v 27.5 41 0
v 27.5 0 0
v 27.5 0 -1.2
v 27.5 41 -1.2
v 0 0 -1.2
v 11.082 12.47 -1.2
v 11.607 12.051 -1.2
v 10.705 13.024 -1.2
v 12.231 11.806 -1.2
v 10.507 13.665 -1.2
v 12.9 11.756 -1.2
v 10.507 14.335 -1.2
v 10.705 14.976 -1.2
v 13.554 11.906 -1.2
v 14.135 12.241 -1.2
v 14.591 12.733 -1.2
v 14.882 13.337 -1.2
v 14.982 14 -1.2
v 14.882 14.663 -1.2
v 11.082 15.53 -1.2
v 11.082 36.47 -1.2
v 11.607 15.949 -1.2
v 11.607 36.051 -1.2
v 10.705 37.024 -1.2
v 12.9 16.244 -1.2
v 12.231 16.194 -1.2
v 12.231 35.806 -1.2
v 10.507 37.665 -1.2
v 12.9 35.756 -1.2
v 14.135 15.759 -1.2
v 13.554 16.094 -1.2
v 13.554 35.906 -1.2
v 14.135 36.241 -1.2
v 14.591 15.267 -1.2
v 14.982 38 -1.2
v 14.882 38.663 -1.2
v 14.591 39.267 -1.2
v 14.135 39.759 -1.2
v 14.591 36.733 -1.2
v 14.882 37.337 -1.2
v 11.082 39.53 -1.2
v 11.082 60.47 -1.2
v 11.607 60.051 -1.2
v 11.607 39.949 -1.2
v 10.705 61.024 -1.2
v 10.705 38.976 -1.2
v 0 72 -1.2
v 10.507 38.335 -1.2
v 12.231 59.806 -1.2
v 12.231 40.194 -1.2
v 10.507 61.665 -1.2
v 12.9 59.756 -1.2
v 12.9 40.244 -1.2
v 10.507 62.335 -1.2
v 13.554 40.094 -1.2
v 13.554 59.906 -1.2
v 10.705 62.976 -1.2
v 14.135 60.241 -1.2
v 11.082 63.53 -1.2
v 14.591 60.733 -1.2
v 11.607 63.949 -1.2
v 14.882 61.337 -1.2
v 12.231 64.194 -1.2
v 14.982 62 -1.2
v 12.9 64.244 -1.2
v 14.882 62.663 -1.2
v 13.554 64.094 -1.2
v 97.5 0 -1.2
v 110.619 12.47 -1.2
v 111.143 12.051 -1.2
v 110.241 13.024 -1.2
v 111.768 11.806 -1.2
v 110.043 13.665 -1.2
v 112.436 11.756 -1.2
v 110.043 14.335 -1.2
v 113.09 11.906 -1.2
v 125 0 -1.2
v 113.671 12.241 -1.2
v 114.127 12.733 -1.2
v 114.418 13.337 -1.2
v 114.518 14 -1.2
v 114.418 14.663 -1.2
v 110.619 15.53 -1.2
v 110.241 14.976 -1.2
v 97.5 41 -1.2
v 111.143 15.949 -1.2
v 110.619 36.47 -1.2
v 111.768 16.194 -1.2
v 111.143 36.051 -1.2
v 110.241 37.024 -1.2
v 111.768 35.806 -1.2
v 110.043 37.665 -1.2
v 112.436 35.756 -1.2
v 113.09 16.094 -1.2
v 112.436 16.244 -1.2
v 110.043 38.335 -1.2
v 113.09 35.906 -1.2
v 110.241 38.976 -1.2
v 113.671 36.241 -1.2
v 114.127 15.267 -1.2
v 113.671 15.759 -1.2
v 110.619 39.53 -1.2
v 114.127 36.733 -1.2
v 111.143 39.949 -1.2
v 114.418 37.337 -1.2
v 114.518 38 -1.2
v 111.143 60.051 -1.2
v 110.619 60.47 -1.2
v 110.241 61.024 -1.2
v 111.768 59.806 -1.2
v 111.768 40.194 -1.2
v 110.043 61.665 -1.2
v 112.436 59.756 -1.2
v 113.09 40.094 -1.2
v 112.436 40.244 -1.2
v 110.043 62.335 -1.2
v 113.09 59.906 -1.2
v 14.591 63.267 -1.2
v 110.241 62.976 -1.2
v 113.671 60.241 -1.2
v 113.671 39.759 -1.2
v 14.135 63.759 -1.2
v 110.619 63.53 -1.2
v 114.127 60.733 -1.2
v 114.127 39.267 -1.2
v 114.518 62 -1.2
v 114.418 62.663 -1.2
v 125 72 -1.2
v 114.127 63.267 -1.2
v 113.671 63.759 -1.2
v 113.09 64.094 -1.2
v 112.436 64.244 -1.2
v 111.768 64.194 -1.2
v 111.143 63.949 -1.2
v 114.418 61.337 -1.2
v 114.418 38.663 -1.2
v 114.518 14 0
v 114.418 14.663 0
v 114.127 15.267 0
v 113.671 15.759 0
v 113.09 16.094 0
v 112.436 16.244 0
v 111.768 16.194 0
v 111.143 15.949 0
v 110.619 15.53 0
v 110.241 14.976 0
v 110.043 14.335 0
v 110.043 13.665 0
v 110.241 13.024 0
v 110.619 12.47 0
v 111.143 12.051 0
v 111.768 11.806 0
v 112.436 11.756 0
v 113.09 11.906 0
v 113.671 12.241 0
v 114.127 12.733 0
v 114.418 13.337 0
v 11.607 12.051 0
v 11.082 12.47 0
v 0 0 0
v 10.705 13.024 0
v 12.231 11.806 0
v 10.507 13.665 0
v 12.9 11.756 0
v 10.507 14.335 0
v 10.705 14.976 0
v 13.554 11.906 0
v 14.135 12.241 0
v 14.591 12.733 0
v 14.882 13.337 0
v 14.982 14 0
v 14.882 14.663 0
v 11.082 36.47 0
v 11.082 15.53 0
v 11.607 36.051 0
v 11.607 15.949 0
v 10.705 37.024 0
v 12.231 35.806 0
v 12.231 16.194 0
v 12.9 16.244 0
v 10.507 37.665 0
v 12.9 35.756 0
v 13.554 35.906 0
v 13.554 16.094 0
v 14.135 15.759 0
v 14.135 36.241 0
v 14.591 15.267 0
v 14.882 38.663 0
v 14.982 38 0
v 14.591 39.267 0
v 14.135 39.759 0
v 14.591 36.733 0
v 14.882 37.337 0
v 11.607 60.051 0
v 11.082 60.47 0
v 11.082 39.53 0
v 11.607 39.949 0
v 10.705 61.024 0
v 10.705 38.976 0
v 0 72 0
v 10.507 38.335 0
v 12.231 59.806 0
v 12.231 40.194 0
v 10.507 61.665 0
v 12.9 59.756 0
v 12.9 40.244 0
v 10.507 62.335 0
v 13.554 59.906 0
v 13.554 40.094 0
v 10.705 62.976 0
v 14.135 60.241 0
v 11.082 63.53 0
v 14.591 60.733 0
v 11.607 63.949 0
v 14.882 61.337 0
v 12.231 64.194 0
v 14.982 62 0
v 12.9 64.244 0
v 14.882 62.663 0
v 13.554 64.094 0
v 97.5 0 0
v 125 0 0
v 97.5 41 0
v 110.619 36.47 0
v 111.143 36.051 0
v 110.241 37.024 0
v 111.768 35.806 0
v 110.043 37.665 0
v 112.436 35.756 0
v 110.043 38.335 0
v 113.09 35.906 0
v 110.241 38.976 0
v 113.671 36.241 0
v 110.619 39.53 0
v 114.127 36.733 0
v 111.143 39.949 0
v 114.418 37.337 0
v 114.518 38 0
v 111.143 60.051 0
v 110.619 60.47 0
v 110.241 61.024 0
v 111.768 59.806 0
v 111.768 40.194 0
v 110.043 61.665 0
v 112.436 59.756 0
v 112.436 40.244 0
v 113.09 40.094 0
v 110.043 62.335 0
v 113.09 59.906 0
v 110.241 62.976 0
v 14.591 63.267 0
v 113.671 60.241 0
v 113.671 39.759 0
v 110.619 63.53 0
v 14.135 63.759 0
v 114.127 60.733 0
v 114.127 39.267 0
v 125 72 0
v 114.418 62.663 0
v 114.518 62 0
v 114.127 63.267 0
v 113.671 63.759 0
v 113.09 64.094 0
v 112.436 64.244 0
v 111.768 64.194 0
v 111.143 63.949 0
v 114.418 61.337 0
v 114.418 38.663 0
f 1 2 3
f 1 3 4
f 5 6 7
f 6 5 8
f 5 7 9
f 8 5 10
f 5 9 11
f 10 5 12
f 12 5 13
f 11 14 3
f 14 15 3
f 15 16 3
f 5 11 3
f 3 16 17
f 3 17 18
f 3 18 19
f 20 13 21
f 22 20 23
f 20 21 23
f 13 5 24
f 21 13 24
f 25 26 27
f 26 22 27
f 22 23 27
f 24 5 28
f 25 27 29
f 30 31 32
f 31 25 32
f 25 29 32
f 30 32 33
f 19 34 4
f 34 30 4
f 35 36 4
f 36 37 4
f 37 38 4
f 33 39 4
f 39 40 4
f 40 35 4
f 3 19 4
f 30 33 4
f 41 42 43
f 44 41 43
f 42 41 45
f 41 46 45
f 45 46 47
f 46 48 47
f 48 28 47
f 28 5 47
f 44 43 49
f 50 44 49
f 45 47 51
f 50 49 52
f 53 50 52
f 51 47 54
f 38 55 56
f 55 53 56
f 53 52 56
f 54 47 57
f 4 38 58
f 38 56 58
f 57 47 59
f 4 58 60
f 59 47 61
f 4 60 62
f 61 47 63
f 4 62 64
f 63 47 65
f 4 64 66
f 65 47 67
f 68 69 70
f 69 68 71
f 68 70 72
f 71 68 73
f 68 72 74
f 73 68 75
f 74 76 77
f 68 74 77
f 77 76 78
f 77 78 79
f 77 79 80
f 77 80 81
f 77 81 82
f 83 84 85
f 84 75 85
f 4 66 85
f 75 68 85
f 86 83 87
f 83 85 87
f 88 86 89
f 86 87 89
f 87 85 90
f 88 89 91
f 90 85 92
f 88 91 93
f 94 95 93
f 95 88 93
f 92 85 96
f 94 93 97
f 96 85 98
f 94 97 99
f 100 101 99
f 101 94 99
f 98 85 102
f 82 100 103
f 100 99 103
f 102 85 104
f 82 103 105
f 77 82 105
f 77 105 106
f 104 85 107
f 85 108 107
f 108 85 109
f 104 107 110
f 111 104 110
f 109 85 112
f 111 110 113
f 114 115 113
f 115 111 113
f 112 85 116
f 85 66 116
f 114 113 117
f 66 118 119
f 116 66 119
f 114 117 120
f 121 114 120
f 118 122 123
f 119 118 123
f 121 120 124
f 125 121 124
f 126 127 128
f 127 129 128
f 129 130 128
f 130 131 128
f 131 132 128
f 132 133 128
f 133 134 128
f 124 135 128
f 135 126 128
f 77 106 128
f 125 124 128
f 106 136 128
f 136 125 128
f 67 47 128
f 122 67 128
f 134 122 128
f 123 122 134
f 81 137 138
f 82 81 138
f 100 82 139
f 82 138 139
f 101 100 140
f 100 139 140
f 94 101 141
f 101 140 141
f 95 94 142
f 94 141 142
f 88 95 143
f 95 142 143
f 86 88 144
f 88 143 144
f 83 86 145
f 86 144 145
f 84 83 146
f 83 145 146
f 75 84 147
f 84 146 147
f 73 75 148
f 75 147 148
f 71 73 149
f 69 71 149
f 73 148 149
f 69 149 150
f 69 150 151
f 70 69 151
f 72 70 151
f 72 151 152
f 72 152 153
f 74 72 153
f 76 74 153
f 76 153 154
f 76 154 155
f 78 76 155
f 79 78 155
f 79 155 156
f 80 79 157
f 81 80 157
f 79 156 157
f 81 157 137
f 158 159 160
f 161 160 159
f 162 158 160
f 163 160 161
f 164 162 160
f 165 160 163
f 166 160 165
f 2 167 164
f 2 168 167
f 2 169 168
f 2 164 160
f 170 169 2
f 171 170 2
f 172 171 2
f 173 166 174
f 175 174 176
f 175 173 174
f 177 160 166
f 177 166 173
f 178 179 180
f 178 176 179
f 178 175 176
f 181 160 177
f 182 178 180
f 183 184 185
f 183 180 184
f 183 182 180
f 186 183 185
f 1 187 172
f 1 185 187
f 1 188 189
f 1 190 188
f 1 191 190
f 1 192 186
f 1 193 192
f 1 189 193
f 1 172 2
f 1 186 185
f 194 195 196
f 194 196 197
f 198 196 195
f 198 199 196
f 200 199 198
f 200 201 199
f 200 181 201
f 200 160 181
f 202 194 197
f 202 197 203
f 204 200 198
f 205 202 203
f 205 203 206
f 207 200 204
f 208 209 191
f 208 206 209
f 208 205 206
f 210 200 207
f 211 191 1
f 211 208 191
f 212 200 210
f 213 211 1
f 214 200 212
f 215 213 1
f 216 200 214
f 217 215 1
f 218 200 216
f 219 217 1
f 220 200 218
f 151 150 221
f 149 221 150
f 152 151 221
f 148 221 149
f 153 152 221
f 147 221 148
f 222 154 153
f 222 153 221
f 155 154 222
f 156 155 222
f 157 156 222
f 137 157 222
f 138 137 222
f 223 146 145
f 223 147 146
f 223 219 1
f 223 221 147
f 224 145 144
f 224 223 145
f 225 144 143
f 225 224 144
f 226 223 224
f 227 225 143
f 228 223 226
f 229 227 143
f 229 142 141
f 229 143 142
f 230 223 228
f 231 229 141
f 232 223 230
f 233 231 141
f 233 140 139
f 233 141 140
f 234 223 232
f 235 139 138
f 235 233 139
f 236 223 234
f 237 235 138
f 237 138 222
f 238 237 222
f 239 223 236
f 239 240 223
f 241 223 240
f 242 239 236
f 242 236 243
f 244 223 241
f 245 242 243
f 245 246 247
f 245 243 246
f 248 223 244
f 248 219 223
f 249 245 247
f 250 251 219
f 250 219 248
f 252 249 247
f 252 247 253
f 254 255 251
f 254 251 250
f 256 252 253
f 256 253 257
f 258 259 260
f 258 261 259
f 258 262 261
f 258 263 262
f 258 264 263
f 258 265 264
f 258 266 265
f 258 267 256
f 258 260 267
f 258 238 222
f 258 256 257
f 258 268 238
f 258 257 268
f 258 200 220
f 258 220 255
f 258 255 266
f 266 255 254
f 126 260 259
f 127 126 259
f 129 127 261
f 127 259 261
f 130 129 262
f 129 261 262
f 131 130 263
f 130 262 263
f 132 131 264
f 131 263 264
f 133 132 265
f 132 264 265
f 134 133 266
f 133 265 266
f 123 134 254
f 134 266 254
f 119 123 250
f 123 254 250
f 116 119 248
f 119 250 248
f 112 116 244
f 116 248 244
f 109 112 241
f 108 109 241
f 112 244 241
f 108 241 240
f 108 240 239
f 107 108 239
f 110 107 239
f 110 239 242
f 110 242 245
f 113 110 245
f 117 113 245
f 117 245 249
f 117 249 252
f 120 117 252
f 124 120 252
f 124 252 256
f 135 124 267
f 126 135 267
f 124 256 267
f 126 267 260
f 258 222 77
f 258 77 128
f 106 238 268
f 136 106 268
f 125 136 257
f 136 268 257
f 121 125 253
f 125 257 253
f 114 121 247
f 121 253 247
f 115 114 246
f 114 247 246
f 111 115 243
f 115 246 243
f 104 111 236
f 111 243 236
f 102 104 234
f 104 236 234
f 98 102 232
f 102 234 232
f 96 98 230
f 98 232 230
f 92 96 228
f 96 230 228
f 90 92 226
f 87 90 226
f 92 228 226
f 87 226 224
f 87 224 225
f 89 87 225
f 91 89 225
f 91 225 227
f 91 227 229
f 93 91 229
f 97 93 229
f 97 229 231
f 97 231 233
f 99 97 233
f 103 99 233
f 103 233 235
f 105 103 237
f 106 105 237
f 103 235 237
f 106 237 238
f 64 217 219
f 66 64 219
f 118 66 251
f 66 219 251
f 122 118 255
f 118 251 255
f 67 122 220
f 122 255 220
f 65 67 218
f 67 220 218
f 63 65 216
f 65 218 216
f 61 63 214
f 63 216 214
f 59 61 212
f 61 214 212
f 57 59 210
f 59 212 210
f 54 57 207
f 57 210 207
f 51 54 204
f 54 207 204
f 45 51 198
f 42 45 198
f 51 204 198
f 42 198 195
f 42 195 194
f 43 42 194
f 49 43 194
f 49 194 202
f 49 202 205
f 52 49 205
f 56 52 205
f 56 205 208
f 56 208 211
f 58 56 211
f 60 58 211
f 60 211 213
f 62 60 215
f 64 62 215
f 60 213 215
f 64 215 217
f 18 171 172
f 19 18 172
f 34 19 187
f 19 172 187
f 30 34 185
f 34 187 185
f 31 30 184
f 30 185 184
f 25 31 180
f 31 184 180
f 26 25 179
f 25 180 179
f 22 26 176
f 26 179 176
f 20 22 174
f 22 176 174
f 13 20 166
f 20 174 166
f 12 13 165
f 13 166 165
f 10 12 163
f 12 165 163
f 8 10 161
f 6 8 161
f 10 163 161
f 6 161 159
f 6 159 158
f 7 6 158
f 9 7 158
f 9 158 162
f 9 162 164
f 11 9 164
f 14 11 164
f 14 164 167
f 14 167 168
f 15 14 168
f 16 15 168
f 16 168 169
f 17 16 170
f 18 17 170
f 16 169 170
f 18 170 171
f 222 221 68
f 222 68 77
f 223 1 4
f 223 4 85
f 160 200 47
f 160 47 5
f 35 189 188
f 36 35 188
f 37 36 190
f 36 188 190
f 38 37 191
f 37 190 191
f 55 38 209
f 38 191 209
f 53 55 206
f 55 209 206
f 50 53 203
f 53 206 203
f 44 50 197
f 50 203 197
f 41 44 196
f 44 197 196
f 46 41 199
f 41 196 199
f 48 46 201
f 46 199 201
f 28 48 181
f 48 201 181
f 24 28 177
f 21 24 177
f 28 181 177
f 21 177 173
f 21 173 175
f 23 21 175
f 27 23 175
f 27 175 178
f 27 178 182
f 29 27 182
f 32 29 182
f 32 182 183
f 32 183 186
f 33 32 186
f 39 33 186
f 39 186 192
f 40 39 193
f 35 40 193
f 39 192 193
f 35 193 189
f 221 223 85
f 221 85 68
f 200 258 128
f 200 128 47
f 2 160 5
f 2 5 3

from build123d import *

# Parameters (mm, degrees)
SKETCH_1_R             = 2.25
SM_BASE_FLANGE_1_DEPTH = 1.2


# Sheet-metal steps are written as plain solids
with BuildPart() as part:
    # Sketch 1 → Базовая кромка1 (new body)
    with BuildSketch(Plane.XY):
        Polygon((97.5, 0), (125, 0), (125, 72), (0, 72), (0, 0), (27.5, 0), (27.5, 41), (97.5, 41), align=None)
        with Locations((112.2683, 62)):
            Circle(SKETCH_1_R, mode=Mode.SUBTRACT)
        with Locations((112.2683, 38)):
            Circle(SKETCH_1_R, mode=Mode.SUBTRACT)
        with Locations((112.2683, 14)):
            Circle(SKETCH_1_R, mode=Mode.SUBTRACT)
        with Locations((12.7317, 62)):
            Circle(SKETCH_1_R, mode=Mode.SUBTRACT)
        with Locations((12.7317, 38)):
            Circle(SKETCH_1_R, mode=Mode.SUBTRACT)
        with Locations((12.7317, 14)):
            Circle(SKETCH_1_R, mode=Mode.SUBTRACT)
    extrude(amount=-SM_BASE_FLANGE_1_DEPTH)


solid = part.part
